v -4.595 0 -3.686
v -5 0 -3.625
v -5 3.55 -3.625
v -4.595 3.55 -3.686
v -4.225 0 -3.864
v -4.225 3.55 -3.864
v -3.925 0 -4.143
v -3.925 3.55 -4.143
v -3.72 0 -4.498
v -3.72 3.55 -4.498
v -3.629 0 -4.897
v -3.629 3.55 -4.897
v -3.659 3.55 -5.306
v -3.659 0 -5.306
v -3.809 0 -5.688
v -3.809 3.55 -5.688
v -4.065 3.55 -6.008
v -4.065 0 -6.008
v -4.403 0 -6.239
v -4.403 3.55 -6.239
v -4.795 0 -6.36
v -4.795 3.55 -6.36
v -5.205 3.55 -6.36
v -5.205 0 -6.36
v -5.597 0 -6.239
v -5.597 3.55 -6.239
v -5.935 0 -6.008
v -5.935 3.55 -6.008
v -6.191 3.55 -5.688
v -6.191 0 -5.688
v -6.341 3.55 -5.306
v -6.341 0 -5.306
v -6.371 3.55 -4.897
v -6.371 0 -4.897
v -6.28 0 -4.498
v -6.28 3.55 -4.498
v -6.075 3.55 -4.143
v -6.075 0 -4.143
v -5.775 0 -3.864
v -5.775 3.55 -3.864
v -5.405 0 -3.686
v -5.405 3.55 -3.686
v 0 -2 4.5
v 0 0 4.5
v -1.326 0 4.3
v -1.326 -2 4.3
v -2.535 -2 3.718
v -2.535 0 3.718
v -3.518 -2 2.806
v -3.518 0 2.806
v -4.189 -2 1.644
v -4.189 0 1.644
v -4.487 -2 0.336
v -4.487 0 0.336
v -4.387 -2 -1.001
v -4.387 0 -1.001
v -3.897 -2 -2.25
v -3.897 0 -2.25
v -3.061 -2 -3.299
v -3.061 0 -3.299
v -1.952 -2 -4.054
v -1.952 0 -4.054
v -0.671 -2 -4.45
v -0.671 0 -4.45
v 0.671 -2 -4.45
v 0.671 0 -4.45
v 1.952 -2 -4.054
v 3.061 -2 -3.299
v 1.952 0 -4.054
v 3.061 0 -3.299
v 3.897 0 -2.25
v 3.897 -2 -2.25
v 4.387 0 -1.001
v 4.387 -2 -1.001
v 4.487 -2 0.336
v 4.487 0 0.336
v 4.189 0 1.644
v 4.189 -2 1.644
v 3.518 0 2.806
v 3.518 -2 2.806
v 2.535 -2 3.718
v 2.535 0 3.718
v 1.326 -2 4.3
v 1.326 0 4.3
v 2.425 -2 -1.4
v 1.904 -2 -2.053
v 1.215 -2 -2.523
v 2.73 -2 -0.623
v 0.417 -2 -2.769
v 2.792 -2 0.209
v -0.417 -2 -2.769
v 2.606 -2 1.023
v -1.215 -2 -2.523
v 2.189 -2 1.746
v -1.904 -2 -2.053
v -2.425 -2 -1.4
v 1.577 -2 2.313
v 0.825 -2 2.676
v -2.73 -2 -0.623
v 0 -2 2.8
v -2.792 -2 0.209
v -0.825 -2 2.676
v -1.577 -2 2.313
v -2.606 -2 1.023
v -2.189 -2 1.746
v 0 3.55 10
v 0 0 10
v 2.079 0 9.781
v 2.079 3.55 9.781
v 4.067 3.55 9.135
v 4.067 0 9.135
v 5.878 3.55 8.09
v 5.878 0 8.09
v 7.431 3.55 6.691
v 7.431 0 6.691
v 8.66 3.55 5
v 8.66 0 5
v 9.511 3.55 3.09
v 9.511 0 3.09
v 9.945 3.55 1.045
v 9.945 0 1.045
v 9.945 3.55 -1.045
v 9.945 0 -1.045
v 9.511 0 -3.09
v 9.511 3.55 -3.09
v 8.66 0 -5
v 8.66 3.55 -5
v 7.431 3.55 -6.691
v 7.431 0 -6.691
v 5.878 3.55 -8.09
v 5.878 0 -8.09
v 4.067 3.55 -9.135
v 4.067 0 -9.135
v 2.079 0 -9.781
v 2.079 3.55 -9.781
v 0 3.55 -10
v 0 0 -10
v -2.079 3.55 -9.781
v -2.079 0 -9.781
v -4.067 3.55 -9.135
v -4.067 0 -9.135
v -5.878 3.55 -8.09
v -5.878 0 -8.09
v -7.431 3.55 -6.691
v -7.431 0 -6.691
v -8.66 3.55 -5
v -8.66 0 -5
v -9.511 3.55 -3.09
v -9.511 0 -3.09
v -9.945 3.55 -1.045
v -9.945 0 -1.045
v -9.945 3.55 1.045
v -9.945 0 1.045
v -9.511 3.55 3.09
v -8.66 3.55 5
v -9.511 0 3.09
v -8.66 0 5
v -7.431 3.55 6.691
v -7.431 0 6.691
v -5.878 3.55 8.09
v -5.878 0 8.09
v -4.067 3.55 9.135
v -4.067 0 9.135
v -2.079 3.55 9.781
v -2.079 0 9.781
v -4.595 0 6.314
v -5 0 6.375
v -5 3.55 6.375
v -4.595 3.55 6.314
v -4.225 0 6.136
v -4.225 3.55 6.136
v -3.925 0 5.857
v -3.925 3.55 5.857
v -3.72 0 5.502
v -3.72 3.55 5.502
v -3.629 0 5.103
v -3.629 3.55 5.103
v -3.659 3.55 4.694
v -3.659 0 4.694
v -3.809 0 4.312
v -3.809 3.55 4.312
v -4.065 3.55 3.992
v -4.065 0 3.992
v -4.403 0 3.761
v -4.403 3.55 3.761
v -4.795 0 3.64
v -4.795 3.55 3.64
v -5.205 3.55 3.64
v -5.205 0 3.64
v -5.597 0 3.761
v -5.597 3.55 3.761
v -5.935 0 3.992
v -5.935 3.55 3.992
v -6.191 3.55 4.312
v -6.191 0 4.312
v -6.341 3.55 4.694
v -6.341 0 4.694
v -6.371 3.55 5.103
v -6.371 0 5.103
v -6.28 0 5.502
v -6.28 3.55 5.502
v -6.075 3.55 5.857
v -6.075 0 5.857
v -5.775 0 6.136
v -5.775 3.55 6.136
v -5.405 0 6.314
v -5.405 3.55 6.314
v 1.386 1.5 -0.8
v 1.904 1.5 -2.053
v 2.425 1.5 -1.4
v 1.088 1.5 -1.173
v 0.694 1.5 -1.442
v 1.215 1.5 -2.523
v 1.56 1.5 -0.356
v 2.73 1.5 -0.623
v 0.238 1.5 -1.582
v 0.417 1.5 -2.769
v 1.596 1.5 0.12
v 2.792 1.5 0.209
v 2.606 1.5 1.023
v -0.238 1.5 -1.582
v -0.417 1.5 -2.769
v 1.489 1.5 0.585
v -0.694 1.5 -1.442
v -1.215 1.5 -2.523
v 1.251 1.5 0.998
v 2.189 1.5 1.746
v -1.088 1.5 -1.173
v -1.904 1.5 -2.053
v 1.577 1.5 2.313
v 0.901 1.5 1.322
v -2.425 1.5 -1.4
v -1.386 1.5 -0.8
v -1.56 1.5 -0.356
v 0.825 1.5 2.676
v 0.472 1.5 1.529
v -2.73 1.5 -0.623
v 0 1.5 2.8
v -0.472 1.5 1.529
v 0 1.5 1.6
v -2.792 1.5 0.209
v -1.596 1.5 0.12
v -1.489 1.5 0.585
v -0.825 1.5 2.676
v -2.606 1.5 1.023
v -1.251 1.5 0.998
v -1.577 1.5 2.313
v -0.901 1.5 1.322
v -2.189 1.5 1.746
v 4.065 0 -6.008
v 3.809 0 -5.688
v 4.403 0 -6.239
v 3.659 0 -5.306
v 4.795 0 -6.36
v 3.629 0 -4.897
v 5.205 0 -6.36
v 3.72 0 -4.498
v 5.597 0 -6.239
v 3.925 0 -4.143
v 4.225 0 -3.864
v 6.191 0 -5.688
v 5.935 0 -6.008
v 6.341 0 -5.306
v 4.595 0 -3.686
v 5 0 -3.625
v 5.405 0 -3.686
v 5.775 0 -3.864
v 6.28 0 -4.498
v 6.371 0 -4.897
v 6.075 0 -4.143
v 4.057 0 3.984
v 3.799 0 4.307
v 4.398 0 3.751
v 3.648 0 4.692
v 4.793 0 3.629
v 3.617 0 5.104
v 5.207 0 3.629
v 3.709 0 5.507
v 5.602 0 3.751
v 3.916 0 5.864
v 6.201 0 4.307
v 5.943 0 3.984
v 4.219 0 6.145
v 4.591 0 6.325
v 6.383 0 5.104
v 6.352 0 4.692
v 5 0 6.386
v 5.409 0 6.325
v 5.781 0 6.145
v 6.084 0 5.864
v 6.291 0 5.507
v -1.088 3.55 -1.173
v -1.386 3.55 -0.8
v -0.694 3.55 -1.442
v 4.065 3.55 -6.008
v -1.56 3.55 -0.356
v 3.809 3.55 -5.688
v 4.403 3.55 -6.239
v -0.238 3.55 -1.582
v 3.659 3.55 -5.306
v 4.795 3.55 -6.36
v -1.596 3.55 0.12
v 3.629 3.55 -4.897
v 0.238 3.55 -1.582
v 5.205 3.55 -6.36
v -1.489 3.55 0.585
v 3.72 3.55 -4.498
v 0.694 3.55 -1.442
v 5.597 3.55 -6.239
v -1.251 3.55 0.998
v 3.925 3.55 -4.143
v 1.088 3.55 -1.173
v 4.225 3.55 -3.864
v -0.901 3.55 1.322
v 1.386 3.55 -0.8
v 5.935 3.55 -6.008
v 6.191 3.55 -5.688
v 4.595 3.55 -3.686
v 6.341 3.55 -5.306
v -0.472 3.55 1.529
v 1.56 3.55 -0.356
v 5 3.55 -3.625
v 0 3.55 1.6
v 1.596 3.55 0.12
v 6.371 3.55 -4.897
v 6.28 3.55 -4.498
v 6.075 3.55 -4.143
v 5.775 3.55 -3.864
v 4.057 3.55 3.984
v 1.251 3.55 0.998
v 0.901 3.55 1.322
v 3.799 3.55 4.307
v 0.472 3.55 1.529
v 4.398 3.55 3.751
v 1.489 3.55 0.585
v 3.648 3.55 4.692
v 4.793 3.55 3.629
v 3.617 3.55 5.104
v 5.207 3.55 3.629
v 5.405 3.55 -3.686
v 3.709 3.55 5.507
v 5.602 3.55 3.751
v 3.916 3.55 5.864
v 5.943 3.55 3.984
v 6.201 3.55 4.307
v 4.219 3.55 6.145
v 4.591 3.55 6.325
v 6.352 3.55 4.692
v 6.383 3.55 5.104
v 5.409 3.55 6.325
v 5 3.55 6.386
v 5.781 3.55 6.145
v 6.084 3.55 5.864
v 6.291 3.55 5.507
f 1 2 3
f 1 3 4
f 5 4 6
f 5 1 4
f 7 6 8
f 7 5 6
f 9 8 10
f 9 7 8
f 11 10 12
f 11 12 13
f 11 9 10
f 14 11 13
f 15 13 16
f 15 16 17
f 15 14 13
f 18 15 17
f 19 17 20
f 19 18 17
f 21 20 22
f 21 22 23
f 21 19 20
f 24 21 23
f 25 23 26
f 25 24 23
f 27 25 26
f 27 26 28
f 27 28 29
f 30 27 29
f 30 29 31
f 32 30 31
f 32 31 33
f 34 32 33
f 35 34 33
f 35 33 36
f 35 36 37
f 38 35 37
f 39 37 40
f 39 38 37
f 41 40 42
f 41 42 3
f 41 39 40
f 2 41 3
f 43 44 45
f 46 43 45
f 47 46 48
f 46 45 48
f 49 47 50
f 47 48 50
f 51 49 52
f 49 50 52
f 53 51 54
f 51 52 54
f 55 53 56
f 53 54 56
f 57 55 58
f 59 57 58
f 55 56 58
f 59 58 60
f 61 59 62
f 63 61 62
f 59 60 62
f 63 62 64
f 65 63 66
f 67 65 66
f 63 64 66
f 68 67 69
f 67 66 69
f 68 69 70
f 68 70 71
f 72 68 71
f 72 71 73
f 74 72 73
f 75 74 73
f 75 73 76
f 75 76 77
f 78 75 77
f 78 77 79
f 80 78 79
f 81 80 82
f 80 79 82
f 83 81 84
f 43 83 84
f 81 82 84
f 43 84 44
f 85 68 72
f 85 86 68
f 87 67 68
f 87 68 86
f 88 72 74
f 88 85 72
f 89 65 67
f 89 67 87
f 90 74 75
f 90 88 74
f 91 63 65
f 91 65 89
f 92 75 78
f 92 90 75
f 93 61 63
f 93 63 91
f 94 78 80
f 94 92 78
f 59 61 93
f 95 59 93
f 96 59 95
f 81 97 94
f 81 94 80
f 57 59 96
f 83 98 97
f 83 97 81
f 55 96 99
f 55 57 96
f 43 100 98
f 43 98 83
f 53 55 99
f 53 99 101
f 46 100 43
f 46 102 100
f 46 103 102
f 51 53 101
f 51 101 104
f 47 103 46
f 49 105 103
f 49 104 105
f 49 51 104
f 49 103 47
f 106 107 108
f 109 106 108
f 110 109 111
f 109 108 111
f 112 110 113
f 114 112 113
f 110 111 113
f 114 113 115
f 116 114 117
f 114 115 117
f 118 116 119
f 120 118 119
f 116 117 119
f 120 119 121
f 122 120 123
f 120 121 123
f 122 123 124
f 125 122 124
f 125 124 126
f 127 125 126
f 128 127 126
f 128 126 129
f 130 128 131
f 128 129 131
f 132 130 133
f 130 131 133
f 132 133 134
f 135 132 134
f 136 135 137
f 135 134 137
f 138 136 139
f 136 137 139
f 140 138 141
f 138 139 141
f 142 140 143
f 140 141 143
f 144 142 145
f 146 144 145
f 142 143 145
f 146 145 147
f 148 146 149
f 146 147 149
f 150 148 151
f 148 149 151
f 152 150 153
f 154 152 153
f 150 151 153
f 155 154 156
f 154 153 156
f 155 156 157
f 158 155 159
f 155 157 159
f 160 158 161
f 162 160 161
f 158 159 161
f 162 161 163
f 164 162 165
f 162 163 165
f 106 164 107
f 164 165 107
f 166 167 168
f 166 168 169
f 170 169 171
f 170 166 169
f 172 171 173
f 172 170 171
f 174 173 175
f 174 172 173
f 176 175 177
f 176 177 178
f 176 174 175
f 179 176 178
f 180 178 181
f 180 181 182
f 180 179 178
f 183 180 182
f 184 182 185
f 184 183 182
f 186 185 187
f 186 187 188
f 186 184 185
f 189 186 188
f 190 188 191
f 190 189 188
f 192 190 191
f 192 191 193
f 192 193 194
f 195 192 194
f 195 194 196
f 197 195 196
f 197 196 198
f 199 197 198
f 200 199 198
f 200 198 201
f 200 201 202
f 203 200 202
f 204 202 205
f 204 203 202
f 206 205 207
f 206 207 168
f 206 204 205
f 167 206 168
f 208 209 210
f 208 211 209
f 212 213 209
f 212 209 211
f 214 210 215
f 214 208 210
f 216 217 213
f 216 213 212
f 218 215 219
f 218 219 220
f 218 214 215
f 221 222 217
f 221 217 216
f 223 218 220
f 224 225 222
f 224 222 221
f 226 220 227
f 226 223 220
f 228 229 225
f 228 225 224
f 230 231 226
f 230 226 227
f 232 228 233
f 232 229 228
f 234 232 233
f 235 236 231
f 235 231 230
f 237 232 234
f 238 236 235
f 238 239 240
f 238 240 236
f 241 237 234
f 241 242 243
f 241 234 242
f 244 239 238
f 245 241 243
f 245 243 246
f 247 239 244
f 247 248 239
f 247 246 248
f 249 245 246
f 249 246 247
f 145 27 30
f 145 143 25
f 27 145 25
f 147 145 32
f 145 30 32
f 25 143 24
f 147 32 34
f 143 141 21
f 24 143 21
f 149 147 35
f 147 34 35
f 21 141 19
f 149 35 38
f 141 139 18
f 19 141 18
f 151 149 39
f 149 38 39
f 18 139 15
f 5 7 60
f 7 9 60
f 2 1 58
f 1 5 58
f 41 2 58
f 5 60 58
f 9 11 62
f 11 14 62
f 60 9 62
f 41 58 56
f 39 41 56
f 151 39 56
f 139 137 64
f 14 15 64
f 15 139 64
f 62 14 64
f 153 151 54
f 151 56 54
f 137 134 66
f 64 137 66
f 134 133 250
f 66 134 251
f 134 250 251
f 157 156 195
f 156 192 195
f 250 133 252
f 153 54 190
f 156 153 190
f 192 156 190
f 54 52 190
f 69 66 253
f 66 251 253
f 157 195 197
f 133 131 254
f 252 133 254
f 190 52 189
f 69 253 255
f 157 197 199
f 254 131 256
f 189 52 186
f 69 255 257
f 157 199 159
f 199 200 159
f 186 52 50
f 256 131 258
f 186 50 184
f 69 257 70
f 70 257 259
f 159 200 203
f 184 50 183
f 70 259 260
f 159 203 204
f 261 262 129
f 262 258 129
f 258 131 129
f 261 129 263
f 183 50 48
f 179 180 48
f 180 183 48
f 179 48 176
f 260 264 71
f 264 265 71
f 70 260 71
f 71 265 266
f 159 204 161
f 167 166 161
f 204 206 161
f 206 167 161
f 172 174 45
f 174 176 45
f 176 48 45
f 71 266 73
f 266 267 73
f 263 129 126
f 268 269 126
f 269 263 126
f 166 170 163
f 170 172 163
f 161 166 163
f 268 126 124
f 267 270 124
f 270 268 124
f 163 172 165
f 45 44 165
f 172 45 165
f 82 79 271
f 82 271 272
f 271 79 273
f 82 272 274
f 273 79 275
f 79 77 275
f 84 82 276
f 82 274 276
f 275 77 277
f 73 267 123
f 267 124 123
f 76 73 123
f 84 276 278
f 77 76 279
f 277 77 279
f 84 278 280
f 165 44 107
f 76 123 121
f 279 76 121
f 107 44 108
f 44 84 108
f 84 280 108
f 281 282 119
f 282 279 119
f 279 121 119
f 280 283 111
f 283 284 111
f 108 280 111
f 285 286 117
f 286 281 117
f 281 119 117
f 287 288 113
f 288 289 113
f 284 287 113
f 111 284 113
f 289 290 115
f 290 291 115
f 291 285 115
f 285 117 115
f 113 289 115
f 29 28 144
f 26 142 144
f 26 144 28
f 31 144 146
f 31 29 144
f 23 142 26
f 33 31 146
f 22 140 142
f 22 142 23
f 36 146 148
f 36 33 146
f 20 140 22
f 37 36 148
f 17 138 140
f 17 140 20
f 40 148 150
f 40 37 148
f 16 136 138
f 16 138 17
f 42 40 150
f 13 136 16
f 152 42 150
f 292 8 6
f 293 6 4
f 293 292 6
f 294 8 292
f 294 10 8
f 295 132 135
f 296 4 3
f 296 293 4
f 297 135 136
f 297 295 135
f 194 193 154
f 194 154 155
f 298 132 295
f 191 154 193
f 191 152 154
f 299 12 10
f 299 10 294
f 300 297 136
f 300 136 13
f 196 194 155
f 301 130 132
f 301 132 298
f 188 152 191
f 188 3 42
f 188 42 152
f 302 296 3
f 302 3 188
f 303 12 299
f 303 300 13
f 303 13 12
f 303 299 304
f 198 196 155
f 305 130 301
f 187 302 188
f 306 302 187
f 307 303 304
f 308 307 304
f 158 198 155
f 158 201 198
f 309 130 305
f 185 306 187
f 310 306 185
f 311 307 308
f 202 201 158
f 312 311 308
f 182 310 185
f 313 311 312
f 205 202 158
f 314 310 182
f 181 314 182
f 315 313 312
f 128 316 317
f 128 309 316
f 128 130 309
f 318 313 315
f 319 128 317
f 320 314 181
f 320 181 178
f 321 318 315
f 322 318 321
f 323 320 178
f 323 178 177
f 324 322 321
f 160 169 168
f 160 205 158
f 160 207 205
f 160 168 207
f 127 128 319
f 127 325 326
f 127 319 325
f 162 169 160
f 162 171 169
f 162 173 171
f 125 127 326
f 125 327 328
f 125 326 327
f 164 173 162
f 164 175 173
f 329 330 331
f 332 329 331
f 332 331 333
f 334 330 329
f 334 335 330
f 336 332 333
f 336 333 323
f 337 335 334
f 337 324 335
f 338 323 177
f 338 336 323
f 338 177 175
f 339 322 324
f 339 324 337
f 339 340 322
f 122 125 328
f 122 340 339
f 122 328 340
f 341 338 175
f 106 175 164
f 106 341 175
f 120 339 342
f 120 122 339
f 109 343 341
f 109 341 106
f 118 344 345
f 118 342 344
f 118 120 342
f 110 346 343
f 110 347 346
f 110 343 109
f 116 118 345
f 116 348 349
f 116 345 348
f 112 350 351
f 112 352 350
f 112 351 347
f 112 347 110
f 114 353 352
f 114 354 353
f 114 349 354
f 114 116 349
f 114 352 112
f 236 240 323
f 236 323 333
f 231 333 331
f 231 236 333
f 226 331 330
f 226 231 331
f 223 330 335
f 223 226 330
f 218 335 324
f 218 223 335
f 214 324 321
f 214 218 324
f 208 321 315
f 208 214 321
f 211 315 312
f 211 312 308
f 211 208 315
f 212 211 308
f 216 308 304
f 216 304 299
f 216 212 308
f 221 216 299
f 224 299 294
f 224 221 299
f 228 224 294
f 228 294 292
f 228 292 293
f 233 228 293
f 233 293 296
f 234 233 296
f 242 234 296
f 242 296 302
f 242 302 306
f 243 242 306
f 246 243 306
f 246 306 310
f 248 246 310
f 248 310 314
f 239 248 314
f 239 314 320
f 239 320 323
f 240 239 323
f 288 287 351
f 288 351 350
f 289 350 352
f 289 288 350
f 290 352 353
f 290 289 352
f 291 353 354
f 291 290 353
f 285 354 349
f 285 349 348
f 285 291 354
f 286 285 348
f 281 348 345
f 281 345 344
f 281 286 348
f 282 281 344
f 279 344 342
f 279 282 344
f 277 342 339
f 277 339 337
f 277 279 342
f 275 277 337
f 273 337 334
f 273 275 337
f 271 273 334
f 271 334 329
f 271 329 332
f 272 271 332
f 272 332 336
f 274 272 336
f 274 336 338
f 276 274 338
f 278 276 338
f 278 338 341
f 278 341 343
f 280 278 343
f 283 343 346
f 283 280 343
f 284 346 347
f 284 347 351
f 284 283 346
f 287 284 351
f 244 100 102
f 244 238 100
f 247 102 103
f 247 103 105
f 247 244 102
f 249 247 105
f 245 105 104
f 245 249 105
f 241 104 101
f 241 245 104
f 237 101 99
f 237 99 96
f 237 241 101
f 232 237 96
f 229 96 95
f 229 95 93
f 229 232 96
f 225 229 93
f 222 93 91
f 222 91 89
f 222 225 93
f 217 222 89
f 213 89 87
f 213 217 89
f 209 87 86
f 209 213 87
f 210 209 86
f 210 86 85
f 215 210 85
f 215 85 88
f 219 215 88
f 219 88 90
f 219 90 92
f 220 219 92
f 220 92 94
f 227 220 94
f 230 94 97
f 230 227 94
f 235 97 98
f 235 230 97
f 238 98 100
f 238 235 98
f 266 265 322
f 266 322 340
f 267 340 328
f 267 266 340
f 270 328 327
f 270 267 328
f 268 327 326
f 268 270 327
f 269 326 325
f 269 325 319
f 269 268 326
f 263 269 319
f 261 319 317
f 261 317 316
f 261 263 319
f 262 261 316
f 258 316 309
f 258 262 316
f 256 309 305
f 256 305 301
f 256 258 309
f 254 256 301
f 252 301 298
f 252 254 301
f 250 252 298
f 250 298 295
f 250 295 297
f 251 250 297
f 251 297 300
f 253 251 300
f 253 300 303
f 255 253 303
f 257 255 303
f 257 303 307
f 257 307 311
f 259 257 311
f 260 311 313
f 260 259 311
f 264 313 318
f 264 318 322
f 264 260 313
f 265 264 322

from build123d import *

# Parameters (mm, degrees)
SKETCH1_R           = 10
SKETCH1_R_2         = 1.6
SKETCH1_R_3         = 1.375
SKETCH1_R_4         = 1.386376747
BOSS_EXTRUDE1_DEPTH = 3.55
SKETCH2_W           = 1.7
SKETCH2_H           = 3.5
CUT_EXTRUDE1_START  = -1.5
SKETCH3_R           = 2.8
CUT_EXTRUDE1_DEPTH  = 1.5


with BuildPart() as part:
    # Sketch1 → Boss-Extrude1 (new body)
    with BuildSketch(Plane(origin=(0, 0, 0), x_dir=(1, 0, 0), z_dir=(0, 1, 0))):
        with Locations(Location((0, 0, 0), (0, 0, 270))):
            Circle(SKETCH1_R)
        with Locations(Location((0, 0, 0), (0, 0, 270))):
            Circle(SKETCH1_R_2, mode=Mode.SUBTRACT)
        with Locations(Location((-5, -5, 0), (0, 0, 270))):
            Circle(SKETCH1_R_3, mode=Mode.SUBTRACT)
        with Locations(Location((5, -5, 0), (0, 0, 270))):
            Circle(SKETCH1_R_4, mode=Mode.SUBTRACT)
        with Locations(Location((5, 5, 0), (0, 0, 270))):
            Circle(SKETCH1_R_3, mode=Mode.SUBTRACT)
        with Locations(Location((-5, 5, 0), (0, 0, 270))):
            Circle(SKETCH1_R_3, mode=Mode.SUBTRACT)
    extrude(amount=BOSS_EXTRUDE1_DEPTH)

    # Sketch2 → Revolve1 (revolve)
    with BuildSketch(Plane.XY, mode=Mode.PRIVATE) as revolve1_sk:
        with Locations((-3.65, -0.25)):
            Rectangle(SKETCH2_W, SKETCH2_H)
    revolve(revolve1_sk.sketch.rotate(Axis((0, 0, 0), (0, -1, 0)), 270), axis=Axis((0, 0, 0), (0, -1, 0)))

    # Sketch3 → Cut-Extrude1 (cut)
    with BuildSketch(Plane.XZ.offset(CUT_EXTRUDE1_START)):
        with Locations(Location((0, 0, 0), (0, 0, 90))):
            Circle(SKETCH3_R)
    extrude(amount=CUT_EXTRUDE1_DEPTH, mode=Mode.SUBTRACT)


solid = part.part
